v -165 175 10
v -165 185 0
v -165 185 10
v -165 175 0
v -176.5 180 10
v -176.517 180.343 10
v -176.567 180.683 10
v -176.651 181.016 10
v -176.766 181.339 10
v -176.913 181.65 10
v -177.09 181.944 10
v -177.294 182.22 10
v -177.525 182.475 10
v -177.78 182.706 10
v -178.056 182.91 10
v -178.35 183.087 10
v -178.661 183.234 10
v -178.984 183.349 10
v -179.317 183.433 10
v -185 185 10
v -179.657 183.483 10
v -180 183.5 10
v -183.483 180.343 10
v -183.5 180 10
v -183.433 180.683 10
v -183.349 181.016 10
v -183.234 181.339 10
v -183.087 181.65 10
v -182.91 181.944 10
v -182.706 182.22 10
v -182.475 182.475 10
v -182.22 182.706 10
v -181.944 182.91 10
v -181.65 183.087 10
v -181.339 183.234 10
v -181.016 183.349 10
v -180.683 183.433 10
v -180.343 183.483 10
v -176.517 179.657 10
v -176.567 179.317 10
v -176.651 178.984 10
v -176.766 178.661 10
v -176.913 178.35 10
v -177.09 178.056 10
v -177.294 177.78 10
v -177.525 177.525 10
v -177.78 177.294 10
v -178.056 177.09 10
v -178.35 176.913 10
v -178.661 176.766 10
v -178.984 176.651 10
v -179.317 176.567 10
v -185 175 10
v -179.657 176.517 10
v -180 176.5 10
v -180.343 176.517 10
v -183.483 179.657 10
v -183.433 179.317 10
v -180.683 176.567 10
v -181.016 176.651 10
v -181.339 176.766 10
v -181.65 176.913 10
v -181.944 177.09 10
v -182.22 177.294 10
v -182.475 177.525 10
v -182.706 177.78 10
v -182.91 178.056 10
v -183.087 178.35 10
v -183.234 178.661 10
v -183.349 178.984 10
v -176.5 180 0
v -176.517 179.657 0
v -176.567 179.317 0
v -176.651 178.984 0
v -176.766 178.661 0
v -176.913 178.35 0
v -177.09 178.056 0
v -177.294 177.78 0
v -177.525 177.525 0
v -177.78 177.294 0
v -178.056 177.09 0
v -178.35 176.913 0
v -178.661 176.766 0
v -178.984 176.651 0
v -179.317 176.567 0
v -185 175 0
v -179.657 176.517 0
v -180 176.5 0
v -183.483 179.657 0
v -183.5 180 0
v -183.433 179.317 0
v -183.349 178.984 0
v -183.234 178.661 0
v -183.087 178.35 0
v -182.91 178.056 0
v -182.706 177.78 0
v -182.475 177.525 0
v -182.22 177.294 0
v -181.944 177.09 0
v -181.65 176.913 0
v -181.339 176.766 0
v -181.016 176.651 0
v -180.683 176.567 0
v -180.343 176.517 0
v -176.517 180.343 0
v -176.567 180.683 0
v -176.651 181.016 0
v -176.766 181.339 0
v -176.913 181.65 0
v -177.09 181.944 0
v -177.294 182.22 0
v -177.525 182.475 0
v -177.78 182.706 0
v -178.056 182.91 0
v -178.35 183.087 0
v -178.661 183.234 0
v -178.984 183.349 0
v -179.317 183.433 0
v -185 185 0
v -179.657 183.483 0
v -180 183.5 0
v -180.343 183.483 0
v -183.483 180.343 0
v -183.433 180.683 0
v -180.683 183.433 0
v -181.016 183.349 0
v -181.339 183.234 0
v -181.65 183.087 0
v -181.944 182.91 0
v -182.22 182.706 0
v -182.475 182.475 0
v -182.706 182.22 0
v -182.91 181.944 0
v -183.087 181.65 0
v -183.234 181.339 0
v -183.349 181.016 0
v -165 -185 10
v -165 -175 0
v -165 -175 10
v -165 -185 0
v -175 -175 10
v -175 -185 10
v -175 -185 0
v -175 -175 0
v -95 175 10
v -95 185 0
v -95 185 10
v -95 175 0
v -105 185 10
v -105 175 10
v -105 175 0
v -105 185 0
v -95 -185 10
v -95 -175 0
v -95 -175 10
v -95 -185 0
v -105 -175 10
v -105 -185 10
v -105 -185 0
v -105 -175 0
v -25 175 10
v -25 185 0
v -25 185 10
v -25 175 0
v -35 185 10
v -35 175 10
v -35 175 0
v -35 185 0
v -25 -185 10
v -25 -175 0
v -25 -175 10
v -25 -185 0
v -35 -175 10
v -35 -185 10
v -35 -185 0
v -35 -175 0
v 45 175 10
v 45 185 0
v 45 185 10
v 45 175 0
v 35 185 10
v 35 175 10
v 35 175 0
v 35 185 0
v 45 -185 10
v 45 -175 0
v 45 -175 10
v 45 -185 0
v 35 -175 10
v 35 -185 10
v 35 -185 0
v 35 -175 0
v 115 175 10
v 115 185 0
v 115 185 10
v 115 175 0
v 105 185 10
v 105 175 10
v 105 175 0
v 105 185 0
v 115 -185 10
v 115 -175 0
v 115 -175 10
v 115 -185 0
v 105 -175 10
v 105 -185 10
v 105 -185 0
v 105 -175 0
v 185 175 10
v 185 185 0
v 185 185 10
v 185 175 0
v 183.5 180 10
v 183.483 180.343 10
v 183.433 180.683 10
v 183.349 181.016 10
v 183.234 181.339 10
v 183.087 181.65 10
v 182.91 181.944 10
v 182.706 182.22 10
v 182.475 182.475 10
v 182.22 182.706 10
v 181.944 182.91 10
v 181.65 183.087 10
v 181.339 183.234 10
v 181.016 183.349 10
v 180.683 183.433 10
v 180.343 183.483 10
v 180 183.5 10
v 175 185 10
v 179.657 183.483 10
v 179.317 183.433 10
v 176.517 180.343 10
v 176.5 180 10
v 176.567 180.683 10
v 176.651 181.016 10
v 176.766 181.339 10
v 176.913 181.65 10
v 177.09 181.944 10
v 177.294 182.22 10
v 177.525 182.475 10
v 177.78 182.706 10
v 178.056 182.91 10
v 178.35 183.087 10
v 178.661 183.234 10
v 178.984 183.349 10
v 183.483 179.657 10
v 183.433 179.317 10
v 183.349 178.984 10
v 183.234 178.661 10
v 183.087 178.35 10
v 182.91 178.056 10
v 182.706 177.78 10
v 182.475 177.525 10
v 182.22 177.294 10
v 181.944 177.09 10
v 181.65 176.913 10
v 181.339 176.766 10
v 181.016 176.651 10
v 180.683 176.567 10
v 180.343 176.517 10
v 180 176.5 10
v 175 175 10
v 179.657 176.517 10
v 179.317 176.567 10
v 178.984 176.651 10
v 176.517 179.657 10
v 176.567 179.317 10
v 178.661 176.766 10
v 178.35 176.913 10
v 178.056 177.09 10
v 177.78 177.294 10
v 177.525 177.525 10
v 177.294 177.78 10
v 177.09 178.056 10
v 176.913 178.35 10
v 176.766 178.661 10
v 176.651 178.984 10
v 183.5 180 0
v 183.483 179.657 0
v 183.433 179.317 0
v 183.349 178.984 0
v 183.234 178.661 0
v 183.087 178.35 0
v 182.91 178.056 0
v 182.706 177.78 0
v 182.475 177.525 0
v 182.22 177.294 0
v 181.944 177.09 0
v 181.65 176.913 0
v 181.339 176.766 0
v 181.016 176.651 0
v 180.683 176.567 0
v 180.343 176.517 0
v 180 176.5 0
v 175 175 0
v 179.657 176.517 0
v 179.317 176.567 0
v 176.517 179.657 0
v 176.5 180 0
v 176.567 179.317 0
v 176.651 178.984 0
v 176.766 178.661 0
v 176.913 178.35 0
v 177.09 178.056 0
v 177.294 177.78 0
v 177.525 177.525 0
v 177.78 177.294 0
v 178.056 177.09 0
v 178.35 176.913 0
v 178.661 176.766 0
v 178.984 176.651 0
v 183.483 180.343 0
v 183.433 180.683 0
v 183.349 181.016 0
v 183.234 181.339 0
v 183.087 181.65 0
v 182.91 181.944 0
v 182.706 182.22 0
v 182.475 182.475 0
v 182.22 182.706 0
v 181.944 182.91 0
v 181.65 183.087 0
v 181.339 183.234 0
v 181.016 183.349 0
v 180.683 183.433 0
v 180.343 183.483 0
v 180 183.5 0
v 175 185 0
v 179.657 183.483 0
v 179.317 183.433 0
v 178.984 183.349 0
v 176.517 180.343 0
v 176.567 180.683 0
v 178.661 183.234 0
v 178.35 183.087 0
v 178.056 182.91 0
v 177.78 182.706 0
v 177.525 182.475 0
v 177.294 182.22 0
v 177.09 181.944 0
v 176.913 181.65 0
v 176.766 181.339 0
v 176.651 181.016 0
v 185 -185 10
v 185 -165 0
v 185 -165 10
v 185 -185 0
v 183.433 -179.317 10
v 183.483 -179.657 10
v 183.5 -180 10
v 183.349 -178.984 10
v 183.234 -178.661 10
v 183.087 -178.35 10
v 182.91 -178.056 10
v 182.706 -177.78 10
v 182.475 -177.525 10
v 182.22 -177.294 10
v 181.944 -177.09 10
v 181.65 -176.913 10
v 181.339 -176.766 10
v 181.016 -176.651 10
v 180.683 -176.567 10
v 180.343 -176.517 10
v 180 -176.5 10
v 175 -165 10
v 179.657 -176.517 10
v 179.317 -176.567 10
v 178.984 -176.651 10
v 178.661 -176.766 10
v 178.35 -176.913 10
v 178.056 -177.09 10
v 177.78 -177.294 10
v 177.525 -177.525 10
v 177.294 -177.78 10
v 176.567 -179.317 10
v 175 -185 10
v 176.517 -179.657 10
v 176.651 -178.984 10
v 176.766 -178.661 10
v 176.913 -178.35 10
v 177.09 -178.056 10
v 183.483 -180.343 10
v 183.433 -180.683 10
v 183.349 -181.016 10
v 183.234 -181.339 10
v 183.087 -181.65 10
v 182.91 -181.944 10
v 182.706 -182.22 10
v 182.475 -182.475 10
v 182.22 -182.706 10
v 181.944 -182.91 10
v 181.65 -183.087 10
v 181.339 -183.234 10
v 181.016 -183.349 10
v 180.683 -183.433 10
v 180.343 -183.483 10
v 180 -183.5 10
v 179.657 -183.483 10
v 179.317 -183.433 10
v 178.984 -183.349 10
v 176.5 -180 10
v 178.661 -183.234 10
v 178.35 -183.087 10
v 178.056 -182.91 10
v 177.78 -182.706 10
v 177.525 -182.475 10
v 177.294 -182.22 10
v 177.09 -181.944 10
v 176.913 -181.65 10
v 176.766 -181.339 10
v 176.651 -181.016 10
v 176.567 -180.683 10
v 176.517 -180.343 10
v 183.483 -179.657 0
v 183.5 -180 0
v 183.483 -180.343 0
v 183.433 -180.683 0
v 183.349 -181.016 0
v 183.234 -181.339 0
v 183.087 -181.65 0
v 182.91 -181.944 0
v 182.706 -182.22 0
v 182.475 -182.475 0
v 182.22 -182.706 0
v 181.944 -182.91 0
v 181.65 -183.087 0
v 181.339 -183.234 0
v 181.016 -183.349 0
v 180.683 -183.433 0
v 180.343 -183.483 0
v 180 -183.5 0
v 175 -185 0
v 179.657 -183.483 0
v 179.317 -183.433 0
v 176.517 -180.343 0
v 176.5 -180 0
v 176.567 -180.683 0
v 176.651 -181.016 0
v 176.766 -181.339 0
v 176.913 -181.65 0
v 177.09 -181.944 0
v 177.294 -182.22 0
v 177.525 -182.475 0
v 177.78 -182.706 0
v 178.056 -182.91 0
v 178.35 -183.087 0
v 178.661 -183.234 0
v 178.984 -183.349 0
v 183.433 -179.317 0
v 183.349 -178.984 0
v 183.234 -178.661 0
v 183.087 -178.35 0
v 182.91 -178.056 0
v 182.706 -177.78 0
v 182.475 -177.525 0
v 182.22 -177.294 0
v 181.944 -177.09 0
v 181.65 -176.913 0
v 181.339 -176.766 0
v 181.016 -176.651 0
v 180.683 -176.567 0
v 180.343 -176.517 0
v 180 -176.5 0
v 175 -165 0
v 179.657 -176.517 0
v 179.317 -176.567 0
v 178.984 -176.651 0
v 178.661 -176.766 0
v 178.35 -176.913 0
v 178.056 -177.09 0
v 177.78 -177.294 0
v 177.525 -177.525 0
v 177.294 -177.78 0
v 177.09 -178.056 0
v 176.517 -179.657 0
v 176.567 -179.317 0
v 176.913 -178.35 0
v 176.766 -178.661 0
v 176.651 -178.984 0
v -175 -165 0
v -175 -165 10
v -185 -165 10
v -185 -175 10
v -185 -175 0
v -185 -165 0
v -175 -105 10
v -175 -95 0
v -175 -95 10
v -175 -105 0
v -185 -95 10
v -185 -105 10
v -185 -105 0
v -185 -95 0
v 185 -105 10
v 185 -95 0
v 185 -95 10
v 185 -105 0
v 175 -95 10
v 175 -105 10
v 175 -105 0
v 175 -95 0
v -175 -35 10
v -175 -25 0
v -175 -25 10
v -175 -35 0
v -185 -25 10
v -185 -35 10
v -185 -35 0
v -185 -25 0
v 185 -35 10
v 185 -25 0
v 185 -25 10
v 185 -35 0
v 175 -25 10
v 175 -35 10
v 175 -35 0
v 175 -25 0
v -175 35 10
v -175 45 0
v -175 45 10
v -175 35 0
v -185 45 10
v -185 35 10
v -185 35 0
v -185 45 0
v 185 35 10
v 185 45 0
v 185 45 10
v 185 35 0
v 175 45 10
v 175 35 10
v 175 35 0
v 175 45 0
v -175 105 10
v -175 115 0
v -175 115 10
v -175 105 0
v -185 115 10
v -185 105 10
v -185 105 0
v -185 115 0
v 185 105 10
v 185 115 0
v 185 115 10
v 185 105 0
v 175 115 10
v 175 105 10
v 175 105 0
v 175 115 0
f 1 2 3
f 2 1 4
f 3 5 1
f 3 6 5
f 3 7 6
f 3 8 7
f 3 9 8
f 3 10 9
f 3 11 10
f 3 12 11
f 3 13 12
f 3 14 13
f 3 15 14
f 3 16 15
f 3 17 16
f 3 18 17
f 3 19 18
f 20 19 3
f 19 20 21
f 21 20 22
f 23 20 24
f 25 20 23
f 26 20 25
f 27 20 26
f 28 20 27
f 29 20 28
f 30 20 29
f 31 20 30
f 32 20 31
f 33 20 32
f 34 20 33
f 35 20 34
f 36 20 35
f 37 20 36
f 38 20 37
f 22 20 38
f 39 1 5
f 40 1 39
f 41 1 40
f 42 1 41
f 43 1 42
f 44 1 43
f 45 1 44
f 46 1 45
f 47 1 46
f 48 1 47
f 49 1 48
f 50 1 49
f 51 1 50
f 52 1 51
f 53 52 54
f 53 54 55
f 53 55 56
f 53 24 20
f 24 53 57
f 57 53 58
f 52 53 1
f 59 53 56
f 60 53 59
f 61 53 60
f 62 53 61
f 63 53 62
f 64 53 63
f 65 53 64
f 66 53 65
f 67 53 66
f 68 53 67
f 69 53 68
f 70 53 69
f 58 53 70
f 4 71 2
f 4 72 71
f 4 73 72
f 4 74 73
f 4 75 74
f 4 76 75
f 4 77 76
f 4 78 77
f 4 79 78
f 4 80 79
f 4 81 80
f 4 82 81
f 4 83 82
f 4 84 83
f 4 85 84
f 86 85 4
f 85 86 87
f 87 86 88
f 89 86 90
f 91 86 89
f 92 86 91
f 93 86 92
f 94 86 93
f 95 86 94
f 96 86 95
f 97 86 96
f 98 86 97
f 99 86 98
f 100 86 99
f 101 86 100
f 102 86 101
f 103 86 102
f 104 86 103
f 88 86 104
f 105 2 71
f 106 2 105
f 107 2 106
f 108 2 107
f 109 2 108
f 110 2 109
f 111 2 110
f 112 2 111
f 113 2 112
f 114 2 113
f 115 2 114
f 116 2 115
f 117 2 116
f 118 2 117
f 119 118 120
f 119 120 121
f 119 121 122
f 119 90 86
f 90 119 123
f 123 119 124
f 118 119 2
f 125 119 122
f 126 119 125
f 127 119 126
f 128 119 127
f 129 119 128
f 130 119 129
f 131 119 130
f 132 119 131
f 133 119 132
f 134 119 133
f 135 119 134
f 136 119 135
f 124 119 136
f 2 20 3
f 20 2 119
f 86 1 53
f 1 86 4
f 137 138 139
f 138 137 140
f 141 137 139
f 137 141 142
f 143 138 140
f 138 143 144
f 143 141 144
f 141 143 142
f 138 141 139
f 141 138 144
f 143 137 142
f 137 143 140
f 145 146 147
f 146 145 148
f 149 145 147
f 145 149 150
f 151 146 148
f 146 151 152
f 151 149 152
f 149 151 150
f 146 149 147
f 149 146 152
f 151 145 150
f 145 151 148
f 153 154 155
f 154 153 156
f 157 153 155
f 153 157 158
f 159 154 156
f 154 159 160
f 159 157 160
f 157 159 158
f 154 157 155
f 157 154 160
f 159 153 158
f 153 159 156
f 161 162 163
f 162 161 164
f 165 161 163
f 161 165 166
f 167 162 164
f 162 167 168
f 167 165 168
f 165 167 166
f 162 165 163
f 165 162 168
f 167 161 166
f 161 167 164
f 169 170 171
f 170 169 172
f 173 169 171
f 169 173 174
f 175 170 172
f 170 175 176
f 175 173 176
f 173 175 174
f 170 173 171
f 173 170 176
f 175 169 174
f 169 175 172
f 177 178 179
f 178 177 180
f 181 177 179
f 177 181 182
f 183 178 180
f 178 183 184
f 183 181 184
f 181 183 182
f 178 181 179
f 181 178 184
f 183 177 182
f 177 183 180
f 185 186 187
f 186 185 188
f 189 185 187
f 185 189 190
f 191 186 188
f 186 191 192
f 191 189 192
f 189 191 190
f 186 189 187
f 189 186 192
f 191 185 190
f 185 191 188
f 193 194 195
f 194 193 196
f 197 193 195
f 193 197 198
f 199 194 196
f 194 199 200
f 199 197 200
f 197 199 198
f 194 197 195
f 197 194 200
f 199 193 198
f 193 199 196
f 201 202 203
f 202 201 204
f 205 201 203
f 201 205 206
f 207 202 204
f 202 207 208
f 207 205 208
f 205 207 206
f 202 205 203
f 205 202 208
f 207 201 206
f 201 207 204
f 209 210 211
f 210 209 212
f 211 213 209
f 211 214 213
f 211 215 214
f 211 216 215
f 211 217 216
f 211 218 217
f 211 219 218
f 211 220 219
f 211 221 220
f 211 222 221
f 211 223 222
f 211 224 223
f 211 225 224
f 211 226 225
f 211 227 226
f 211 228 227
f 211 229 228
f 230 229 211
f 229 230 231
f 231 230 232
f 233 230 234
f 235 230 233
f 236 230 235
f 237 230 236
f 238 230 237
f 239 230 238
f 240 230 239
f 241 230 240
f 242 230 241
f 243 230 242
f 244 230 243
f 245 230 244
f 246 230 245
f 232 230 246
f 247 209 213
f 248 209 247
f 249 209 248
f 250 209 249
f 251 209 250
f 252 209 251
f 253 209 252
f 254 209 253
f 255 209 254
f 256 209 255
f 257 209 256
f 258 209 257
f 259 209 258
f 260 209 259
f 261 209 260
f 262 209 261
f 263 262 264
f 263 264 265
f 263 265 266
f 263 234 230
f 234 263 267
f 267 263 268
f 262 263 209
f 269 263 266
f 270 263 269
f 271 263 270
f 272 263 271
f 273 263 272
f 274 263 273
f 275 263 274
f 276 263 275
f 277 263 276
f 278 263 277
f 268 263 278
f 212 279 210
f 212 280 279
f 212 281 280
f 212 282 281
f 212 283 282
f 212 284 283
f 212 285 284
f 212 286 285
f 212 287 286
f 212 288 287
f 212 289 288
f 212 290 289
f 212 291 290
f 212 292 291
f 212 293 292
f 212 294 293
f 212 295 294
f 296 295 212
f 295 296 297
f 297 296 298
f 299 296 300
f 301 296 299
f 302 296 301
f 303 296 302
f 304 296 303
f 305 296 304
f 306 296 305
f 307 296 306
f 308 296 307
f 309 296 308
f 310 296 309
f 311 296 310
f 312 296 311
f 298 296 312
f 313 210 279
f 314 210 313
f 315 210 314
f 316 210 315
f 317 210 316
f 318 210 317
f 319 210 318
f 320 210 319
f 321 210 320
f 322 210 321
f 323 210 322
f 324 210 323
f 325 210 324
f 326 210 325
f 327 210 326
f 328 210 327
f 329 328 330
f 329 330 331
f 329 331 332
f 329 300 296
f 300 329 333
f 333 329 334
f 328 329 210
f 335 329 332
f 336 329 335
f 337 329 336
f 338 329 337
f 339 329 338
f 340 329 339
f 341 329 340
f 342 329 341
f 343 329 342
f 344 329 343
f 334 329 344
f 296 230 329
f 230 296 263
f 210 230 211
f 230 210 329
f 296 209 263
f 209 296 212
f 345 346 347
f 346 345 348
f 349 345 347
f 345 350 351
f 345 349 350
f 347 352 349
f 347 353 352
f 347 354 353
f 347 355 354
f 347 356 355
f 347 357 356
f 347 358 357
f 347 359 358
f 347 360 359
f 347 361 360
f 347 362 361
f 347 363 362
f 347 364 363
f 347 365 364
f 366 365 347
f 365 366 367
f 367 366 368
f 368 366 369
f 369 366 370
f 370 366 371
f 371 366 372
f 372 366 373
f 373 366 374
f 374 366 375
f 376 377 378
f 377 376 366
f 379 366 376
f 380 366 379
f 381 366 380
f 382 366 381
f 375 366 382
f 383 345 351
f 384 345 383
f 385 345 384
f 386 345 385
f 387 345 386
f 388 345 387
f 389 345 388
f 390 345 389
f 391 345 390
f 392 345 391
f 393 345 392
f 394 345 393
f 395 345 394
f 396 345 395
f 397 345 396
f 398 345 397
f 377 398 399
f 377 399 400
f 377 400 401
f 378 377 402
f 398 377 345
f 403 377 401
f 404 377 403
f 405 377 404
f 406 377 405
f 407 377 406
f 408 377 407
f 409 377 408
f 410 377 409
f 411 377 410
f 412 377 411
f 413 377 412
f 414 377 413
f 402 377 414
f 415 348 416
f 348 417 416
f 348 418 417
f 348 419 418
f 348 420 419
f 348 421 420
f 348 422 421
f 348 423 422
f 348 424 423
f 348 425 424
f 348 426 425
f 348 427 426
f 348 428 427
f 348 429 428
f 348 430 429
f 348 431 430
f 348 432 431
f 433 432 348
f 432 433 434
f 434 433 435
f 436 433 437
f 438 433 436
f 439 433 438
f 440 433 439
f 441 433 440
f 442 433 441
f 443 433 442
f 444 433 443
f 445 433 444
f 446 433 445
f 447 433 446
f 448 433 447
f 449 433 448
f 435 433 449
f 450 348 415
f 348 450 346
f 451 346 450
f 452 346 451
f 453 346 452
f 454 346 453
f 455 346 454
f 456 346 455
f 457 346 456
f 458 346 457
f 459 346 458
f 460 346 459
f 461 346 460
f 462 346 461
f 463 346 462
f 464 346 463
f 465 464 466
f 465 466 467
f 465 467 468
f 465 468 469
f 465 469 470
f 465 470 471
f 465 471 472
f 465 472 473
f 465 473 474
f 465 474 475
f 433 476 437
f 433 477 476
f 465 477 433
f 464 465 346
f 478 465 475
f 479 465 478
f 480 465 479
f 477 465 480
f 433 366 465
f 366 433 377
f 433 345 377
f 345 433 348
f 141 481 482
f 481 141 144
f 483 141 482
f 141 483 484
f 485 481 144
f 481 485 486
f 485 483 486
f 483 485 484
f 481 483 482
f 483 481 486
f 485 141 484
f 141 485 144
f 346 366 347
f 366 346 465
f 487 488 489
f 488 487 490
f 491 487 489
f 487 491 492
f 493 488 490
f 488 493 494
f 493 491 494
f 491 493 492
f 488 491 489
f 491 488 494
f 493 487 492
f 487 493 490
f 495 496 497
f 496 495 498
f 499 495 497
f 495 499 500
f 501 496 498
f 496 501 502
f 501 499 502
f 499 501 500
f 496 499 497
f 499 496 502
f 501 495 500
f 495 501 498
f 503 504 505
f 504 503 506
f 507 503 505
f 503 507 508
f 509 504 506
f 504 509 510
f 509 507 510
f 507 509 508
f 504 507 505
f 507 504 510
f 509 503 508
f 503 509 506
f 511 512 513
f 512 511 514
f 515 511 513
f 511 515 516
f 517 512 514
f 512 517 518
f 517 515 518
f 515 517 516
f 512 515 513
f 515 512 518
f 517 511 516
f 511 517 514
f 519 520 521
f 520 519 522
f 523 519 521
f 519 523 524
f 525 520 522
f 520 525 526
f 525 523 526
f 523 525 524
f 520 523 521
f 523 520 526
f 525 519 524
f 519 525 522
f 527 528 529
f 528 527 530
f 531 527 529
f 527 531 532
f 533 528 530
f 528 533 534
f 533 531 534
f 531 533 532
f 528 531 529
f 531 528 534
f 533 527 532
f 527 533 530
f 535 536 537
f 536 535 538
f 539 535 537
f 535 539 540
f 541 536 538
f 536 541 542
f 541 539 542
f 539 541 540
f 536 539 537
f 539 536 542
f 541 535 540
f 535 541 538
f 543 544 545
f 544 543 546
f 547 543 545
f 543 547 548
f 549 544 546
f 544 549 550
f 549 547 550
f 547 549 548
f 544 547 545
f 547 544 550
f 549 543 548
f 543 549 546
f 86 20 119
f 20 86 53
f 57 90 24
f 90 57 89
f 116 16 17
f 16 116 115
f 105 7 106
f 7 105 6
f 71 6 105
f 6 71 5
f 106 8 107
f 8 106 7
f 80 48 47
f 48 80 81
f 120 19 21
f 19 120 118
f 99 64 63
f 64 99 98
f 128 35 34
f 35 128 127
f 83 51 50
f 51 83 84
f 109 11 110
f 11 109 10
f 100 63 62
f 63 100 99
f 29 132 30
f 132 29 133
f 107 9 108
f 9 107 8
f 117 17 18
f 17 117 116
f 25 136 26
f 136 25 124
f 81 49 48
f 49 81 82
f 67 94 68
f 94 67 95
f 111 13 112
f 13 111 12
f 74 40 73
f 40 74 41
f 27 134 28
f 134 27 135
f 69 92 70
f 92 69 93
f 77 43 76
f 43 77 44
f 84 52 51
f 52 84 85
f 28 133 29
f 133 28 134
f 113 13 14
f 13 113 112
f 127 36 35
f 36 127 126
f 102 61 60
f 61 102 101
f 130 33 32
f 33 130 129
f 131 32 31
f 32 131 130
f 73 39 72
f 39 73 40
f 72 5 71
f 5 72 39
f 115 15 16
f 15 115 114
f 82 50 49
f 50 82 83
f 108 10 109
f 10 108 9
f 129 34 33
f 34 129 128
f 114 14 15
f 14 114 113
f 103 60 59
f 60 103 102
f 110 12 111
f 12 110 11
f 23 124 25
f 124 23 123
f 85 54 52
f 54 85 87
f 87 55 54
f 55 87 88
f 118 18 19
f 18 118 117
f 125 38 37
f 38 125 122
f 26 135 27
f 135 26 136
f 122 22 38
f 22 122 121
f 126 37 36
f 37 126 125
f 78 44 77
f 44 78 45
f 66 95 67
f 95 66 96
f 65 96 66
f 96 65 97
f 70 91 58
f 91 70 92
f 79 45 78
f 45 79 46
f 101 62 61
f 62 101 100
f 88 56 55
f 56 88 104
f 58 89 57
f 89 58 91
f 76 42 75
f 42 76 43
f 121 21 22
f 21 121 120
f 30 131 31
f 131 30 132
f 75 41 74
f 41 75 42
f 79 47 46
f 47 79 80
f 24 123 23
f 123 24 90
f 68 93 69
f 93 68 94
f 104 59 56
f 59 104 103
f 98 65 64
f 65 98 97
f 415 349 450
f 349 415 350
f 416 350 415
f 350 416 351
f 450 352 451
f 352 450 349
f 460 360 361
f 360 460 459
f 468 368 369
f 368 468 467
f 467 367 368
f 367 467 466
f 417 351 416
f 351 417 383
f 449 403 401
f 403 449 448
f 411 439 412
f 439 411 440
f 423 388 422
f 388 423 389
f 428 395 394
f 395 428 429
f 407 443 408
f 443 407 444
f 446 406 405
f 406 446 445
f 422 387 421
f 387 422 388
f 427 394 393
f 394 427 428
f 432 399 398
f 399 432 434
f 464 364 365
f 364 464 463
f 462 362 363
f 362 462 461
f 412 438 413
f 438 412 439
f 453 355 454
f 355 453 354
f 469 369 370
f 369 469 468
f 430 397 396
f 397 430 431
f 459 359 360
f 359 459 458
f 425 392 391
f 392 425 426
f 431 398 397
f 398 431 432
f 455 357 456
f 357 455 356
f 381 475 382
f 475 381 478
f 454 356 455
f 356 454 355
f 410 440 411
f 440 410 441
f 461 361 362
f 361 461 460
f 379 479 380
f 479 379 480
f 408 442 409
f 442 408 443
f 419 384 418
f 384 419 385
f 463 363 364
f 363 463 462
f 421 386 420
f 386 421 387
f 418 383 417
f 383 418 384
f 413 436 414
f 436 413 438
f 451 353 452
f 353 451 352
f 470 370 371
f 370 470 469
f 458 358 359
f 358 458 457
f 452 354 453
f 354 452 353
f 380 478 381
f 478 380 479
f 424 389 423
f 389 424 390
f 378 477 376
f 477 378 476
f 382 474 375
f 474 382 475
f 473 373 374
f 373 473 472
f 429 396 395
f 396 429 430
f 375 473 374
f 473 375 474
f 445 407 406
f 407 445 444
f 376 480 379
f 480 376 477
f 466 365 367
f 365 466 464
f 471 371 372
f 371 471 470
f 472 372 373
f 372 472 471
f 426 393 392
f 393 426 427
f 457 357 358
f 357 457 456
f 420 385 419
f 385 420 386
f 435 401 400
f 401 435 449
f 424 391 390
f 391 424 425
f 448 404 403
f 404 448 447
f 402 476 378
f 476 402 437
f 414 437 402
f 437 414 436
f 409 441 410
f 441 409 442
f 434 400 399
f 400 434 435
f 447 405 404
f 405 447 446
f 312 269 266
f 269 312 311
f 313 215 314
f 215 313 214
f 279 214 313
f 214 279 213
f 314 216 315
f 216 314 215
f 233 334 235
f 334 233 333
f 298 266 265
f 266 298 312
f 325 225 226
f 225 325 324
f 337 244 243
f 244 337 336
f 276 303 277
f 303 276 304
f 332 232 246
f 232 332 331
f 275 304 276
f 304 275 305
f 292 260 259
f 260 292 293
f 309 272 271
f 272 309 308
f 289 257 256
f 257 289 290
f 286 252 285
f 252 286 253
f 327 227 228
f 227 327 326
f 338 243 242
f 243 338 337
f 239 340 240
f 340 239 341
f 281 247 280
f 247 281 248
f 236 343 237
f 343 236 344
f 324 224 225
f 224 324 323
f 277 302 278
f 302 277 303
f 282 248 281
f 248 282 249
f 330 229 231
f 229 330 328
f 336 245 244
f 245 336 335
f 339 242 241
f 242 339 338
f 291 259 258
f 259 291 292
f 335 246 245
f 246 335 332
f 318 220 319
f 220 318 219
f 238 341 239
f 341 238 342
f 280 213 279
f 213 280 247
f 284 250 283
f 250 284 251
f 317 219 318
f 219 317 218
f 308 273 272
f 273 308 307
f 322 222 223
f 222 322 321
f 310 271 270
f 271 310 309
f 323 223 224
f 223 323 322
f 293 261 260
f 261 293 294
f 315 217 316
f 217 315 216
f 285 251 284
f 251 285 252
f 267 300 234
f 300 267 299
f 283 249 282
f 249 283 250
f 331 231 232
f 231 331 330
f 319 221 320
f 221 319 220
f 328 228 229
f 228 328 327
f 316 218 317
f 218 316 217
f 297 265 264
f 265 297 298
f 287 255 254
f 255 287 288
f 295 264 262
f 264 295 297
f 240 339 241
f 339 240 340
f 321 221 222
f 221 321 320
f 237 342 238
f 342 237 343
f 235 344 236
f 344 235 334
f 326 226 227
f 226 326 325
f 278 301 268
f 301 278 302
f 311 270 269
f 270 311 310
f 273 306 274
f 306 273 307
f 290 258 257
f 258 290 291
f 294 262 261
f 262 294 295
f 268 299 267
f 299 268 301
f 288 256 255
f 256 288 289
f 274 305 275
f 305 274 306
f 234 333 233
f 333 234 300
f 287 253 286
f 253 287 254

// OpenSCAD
// ring_19.scad - ring index 19 (z bottom = 190 mm)
$fn = 64; bar = 10; half_b = bar/2; outer = 370; half_outer = outer/2;
front_y = 180; back_y = -180; left_x = -180; right_x = 180;
x_centers = [-170, -100, -30, 40, 110, 180];
z_centers = [5, 85, 155, 225, 295, 365, 435, 505, 575, 645, 715]; ring_z = 190;
module place_box(cx, cy, sx, sy) { translate([cx - sx/2, cy - sy/2, 0]) cube([sx, sy, bar]); }

difference() { union() {
    for (x = x_centers) { place_box(x, front_y, bar, bar); place_box(x, back_y, bar, bar); }
    for (y = x_centers) { place_box(left_x, y, bar, bar); place_box(right_x, y, bar, bar); }
    for (zc = z_centers) if ((zc - half_b < ring_z + bar) && (zc + half_b > ring_z)) {
        translate([-half_outer, front_y - half_b, 0]) cube([outer, bar, bar]);
        translate([-half_outer, back_y - half_b, 0])  cube([outer, bar, bar]);
        translate([left_x - half_b, -half_outer, 0])  cube([bar, outer, bar]);
        translate([right_x - half_b, -half_outer, 0]) cube([bar, outer, bar]);
    }
  }
  for (cx = [-180, 180]) for (cy = [-180, 180]) translate([cx, cy, 0]) cylinder(h = bar, r = 3.5, $fn = 64);
}
